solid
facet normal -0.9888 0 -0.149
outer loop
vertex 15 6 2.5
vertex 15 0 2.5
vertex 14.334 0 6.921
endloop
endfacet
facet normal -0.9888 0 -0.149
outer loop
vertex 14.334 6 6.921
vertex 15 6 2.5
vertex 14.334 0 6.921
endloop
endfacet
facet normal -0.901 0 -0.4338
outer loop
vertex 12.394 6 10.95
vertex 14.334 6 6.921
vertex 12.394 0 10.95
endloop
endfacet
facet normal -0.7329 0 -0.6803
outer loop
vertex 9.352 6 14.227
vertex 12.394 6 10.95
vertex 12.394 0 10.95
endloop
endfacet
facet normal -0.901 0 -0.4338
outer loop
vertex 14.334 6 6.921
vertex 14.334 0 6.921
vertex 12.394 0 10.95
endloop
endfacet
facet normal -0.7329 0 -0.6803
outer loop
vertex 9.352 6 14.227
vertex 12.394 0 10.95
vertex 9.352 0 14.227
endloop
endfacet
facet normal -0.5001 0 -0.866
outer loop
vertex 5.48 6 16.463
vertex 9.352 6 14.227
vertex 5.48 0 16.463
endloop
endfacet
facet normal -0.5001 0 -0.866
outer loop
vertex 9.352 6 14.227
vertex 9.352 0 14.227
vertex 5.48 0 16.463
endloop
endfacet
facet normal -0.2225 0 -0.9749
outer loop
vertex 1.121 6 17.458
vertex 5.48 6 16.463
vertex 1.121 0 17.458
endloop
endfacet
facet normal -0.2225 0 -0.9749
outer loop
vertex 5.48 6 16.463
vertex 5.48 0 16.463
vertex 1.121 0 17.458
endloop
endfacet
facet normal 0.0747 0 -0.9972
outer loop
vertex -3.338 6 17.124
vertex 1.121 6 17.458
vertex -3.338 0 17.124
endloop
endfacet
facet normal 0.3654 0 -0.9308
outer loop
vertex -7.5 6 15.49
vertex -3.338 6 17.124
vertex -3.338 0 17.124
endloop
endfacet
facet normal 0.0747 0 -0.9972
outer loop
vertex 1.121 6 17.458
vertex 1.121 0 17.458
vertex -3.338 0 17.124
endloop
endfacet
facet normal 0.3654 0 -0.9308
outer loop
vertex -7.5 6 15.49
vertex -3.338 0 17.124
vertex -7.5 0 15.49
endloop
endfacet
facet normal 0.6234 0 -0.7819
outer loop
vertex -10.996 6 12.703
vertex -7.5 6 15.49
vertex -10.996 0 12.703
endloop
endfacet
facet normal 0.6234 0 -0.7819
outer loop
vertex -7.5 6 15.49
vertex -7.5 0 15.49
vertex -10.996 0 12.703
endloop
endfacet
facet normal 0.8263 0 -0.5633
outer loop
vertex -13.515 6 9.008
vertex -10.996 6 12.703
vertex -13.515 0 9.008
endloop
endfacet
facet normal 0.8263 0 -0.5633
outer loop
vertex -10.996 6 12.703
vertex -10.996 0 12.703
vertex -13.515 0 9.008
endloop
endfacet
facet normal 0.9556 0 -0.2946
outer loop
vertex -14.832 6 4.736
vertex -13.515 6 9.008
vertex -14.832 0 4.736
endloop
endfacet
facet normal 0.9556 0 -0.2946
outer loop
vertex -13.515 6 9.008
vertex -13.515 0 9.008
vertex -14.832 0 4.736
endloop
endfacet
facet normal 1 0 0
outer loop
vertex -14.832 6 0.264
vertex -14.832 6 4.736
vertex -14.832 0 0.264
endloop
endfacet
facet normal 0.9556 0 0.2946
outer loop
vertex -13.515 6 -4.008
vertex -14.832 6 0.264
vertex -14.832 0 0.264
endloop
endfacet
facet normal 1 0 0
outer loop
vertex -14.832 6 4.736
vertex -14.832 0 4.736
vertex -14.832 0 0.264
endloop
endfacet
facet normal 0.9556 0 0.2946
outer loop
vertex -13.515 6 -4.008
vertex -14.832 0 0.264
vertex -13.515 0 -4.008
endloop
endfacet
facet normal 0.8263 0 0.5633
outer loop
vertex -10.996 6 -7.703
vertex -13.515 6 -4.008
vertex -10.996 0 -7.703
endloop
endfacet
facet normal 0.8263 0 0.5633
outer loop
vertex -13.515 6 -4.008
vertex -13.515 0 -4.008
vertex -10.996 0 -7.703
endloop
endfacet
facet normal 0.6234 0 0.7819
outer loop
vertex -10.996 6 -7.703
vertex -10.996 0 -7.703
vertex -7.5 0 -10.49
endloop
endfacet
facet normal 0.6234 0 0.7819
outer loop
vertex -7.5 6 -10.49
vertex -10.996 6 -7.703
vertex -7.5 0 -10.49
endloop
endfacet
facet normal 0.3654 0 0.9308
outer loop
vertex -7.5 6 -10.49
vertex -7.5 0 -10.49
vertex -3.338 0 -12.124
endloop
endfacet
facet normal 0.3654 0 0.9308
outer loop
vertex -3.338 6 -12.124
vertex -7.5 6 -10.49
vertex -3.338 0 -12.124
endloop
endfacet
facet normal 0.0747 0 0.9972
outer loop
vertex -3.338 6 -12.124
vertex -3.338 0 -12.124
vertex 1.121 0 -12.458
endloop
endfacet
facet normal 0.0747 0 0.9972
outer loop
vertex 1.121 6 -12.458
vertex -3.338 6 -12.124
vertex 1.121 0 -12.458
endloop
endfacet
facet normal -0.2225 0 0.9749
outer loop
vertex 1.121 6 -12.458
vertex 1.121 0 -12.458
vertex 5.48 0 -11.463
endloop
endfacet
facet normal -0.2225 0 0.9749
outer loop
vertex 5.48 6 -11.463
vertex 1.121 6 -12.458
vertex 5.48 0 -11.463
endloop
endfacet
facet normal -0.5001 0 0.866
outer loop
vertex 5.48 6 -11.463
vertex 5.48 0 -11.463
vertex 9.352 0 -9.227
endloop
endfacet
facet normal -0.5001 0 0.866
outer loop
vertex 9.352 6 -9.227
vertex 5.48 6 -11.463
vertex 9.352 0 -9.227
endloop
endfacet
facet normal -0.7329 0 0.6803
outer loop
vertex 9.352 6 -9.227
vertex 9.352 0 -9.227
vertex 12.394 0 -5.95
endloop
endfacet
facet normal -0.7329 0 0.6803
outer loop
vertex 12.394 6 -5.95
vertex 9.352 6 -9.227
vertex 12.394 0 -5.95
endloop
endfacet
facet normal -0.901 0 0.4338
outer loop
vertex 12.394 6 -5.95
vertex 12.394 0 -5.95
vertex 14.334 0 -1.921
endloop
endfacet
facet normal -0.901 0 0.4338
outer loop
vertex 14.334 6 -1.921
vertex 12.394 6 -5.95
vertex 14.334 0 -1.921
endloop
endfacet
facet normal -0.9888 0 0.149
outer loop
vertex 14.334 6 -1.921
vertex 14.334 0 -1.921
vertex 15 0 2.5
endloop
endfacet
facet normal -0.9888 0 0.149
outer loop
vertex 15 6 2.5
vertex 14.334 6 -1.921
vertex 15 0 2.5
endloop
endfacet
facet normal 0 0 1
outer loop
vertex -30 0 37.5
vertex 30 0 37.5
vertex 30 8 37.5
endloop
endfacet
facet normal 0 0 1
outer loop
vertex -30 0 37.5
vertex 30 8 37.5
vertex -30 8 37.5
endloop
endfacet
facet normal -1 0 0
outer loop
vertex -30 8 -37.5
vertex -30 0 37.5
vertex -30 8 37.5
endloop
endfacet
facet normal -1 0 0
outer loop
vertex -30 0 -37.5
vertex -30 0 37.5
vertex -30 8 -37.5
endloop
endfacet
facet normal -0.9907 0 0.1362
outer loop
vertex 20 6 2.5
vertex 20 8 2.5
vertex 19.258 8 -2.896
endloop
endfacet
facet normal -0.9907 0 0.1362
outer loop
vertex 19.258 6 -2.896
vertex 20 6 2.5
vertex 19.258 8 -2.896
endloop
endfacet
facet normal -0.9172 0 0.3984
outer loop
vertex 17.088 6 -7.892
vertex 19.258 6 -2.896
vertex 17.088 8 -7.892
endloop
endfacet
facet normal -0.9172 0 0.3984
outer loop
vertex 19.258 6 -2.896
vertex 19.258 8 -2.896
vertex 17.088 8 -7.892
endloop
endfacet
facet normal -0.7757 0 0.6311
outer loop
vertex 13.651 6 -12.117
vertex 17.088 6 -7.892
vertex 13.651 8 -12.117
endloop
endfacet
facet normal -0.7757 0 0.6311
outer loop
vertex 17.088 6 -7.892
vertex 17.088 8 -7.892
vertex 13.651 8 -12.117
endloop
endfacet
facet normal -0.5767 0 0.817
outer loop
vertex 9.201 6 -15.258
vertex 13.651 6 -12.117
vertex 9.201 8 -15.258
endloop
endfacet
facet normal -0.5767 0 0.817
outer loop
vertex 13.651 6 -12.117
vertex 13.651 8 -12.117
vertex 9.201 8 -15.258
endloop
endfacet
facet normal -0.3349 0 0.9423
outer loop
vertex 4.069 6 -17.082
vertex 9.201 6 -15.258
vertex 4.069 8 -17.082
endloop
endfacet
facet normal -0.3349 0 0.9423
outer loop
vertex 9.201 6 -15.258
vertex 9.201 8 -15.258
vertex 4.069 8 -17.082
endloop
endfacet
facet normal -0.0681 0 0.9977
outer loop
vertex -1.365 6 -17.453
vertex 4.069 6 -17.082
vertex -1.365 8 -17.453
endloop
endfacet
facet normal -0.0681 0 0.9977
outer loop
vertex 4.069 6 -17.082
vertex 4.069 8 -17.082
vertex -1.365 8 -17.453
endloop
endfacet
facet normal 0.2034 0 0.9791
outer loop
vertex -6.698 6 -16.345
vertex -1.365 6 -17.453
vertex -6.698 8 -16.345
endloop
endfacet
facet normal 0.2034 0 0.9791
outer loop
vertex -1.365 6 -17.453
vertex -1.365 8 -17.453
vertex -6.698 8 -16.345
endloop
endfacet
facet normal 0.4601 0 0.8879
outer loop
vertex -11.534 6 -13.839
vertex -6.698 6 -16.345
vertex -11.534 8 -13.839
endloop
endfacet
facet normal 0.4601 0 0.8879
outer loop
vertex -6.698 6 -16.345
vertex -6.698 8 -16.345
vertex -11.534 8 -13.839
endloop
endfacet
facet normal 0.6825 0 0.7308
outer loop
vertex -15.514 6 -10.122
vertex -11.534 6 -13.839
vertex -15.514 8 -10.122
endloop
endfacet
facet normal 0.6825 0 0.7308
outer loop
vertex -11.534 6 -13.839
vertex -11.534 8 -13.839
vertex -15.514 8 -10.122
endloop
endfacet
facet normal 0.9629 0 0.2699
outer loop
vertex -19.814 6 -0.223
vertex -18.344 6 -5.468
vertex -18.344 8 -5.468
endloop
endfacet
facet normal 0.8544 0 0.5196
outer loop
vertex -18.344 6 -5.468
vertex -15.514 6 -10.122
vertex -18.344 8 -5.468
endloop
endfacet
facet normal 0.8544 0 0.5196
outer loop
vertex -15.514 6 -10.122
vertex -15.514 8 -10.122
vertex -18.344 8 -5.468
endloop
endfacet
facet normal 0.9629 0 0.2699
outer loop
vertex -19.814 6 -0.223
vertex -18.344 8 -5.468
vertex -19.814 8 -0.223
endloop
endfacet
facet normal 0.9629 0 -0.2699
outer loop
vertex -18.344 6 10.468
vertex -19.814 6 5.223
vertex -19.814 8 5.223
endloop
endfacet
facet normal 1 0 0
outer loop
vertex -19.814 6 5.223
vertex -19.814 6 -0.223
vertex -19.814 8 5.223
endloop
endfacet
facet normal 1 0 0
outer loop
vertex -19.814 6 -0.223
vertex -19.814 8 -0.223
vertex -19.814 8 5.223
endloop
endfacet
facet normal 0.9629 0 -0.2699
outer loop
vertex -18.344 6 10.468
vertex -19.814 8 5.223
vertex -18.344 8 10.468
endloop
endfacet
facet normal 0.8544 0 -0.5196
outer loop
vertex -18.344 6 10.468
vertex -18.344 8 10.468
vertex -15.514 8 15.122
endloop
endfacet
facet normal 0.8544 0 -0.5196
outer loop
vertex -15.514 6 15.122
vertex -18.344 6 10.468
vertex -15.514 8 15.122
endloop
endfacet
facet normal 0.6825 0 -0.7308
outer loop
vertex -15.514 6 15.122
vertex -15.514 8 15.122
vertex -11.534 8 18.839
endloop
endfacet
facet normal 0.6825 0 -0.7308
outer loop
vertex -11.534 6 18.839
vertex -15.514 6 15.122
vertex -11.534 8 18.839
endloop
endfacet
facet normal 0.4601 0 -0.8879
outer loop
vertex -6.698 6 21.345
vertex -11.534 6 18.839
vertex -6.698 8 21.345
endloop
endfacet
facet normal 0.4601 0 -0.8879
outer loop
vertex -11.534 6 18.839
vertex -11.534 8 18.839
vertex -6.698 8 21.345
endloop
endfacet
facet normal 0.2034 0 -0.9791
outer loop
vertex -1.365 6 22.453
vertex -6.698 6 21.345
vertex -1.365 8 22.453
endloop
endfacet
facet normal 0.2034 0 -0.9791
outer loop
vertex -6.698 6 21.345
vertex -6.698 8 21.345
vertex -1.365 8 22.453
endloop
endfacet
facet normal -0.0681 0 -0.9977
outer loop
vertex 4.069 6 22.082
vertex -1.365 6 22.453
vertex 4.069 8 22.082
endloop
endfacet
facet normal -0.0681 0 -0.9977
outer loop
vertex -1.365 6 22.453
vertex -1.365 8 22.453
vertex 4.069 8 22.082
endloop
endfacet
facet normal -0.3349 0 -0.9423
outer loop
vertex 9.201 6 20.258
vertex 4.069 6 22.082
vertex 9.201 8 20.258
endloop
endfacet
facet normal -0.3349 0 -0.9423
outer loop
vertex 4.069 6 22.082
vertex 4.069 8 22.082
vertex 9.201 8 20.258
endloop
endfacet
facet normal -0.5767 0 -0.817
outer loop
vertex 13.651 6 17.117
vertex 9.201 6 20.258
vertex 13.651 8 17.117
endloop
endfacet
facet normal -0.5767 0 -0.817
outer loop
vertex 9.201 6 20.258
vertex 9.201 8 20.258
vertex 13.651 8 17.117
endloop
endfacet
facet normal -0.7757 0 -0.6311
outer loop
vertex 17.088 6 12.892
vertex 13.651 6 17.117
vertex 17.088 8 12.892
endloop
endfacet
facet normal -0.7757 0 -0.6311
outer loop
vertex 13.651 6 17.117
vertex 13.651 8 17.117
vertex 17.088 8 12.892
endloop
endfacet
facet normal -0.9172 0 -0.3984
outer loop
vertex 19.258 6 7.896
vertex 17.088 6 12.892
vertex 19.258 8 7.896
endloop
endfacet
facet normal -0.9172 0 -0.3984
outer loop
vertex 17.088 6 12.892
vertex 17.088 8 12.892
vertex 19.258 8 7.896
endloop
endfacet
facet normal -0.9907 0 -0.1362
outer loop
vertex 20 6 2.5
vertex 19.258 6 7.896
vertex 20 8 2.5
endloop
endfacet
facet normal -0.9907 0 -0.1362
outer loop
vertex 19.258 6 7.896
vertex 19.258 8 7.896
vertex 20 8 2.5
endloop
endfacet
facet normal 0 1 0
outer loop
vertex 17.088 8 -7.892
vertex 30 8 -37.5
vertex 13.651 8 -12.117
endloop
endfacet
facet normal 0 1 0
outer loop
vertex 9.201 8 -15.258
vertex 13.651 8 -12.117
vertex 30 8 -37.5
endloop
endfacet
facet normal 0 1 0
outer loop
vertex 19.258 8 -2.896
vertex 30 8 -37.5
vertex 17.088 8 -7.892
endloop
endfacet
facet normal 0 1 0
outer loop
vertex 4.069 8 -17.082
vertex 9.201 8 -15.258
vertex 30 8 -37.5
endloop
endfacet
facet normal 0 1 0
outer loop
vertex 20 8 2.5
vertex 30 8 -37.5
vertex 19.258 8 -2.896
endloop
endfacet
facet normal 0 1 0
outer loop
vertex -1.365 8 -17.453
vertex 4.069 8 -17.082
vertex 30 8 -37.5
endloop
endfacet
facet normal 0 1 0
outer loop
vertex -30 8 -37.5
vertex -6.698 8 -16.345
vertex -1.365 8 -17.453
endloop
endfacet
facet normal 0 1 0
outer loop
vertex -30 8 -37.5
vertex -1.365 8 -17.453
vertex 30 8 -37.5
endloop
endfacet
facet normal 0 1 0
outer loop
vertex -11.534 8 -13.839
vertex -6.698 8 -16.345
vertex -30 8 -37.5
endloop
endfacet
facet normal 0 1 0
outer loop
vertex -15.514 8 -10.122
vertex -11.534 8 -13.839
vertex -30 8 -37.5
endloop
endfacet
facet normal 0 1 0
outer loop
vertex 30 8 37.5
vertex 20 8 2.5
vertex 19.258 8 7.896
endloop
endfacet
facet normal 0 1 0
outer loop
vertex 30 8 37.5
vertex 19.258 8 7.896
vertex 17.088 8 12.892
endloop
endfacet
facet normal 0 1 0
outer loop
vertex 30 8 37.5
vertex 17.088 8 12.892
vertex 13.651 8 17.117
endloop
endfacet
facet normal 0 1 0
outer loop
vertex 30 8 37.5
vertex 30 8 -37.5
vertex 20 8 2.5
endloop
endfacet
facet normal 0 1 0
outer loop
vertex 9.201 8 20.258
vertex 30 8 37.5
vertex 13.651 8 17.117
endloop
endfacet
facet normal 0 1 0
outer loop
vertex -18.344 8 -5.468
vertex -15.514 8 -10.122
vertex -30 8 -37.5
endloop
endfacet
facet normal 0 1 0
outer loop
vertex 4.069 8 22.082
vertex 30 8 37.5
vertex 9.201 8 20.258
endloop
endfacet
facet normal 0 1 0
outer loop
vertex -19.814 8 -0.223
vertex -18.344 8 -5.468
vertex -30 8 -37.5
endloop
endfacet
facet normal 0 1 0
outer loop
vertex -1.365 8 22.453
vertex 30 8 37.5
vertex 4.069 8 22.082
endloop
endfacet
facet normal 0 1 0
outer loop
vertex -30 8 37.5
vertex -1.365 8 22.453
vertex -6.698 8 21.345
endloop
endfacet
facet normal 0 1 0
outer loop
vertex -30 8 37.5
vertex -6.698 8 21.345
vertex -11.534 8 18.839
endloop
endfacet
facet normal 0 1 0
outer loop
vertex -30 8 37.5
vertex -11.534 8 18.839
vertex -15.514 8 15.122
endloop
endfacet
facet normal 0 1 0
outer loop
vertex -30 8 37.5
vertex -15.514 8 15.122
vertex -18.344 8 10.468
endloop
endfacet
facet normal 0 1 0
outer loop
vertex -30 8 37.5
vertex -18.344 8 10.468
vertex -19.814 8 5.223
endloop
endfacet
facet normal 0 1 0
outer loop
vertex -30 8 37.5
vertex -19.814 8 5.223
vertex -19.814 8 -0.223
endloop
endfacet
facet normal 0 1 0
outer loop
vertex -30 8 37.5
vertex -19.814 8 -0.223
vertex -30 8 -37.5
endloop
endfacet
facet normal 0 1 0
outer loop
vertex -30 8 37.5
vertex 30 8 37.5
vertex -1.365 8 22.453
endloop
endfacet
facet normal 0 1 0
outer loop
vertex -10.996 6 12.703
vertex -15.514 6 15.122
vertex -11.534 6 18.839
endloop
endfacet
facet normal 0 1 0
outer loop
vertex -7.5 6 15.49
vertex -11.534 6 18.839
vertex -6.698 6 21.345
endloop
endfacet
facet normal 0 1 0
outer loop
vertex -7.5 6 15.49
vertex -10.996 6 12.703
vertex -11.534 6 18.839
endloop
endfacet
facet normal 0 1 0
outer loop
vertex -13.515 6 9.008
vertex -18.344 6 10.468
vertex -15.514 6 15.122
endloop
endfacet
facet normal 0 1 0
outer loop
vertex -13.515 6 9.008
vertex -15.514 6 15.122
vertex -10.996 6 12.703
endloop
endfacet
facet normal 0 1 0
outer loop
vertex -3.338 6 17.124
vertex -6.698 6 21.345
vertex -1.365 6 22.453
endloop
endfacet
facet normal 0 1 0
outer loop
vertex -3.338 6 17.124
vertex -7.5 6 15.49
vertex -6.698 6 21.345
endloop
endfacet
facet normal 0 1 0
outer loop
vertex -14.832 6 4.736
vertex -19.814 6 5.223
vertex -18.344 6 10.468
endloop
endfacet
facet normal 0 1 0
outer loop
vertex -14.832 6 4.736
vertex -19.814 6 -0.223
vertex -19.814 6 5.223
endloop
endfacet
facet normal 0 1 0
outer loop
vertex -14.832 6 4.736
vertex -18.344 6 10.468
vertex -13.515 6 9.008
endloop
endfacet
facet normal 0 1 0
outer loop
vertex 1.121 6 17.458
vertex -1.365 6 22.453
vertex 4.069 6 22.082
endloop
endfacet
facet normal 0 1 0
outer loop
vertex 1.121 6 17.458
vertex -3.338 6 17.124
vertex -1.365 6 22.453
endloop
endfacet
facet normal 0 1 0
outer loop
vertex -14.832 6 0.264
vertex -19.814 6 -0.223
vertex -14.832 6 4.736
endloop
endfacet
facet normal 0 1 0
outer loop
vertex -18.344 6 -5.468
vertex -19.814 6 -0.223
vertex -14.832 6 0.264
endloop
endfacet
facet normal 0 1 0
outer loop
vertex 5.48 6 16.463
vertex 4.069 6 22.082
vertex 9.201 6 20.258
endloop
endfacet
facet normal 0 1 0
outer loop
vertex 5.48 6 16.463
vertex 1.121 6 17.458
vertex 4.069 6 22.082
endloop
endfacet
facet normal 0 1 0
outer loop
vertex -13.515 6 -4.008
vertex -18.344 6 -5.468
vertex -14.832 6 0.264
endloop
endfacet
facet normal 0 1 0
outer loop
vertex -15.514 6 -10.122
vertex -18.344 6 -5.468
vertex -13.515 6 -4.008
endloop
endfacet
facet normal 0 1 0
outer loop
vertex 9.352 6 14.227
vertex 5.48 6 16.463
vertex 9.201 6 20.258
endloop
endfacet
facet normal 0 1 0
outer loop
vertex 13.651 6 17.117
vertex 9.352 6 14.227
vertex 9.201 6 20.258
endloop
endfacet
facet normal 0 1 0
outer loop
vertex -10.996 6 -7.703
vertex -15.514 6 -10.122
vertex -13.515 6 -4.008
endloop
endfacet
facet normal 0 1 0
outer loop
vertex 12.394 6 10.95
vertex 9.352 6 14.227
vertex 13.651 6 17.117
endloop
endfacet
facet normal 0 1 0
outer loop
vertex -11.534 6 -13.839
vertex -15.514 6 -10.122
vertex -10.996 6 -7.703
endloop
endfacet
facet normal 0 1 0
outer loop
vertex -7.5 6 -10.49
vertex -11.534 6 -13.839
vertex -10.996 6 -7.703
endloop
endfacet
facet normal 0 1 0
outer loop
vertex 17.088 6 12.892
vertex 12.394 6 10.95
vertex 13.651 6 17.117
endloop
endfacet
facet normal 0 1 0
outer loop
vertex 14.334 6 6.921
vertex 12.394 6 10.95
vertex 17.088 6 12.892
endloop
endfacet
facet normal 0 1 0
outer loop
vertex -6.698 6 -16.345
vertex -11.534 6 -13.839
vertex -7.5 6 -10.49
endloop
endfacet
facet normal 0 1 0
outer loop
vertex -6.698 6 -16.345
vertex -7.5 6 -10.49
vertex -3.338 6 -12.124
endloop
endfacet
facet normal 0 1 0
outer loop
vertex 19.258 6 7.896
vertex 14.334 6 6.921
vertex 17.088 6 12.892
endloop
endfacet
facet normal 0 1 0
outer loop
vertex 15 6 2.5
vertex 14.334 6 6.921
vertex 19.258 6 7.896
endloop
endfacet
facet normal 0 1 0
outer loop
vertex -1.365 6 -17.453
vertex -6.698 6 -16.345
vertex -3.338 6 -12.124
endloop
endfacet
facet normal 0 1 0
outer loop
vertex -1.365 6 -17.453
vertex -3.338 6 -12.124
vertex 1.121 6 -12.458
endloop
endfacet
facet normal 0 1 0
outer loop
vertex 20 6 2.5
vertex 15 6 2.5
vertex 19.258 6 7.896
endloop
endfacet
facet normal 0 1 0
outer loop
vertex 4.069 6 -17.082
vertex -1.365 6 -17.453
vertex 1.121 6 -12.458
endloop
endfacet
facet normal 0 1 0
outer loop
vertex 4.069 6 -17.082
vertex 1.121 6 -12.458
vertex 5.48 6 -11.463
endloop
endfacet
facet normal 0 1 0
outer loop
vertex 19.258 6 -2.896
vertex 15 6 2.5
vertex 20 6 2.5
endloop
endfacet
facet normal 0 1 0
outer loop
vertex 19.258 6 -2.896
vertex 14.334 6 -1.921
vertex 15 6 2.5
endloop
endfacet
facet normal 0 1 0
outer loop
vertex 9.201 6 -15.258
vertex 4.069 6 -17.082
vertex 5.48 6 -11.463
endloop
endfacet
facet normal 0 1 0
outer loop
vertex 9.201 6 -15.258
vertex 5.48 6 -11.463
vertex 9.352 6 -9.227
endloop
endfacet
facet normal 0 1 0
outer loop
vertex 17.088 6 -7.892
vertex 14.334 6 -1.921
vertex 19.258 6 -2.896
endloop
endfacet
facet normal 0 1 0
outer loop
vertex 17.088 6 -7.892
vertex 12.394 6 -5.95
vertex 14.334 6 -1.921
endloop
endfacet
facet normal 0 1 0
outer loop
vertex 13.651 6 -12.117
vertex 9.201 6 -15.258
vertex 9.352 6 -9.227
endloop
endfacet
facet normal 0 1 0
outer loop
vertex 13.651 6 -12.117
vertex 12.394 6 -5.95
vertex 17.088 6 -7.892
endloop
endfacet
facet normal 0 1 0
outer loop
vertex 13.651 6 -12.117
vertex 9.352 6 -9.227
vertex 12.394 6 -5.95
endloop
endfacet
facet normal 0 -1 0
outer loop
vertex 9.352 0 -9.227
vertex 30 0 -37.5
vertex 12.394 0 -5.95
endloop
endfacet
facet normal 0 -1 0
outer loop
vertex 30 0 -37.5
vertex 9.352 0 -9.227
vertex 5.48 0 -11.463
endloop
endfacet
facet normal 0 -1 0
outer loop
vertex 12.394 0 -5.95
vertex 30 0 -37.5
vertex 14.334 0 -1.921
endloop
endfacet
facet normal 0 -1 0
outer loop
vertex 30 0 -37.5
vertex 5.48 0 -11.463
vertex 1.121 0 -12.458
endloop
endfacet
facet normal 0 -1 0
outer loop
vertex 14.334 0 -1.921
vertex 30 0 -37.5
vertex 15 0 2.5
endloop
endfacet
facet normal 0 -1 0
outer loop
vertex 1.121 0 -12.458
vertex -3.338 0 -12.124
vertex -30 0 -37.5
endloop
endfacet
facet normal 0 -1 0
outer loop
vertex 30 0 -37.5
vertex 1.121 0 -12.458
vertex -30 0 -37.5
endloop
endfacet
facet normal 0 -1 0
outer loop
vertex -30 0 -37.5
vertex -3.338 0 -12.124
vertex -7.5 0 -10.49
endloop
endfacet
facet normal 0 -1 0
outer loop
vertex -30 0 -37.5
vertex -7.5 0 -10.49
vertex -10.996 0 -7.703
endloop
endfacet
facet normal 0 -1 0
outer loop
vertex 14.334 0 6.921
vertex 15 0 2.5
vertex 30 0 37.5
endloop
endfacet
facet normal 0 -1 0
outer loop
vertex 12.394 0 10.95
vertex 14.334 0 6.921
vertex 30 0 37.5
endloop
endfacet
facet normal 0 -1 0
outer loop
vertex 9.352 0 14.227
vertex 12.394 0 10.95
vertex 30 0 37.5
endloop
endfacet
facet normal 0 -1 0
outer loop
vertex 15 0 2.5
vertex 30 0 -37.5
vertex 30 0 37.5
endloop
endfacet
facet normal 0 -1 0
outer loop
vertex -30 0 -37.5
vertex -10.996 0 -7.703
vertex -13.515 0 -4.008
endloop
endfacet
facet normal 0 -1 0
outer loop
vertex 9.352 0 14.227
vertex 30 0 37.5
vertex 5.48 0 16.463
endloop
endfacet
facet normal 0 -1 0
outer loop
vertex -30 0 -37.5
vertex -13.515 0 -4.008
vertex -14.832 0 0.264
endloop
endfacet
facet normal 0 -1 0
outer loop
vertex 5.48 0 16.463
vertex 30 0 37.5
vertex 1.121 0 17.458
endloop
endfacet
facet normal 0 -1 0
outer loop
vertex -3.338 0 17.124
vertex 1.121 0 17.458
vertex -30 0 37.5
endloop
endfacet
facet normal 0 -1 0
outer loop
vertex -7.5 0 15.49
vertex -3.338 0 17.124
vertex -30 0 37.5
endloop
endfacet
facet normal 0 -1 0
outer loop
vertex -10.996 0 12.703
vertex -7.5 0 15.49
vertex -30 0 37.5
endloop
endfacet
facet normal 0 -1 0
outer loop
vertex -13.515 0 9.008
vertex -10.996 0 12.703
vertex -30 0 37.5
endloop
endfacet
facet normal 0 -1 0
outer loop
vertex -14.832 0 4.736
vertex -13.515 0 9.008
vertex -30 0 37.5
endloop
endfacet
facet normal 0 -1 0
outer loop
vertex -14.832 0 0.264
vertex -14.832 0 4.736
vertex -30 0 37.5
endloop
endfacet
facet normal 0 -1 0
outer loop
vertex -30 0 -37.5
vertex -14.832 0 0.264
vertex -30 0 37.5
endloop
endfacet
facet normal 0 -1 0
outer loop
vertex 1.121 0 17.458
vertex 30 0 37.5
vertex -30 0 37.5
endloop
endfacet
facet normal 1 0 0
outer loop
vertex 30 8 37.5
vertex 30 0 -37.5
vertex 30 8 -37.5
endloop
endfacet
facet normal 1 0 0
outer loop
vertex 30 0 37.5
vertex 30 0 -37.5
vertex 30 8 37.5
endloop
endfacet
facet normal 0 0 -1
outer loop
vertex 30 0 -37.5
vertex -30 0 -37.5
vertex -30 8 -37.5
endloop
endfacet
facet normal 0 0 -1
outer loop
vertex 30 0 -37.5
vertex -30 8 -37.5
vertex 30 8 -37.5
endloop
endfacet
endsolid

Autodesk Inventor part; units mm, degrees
ref_plane "YZ Plane" through (0, 0, 0) normal (1, 0, 0) x (0, 1, 0)
ref_plane "XZ Plane" through (0, 0, 0) normal (0, 1, 0) x (-1, 0, 0)
ref_plane "XY Plane" through (0, 0, 0) normal (0, 0, 1) x (1, 0, 0)
sketch "Szkic1" plane through (0, 0, 0) normal (0, 1, 0) x (-1, 0, 0)
  line L0 (-30, 37.5) -> (30, 37.5)
  line L1 (30, 37.5) -> (30, -37.5)
  line L2 (30, -37.5) -> (-30, -37.5)
  line L3 (-30, -37.5) -> (-30, 37.5)
  line L4 (-30, 37.5) -> (30, -37.5) construction
  line L5 (30, 37.5) -> (-30, -37.5) construction
  point P0 (0, 0)
  dimension "d0" = 60
  dimension "d1" = 75
extrude "Wyciągnięcie proste1" add sketch "Szkic1" along normal blind 8
sketch "Szkic2" plane through (0, 8, 0) normal (0, 1, 0) x (1, 0, 0)
  line L0 (-30, -37.5) -> (30, -37.5) projected
  line L1 (0, -37.5) -> (0, -2.5)
  circle A0 centre (0, -2.5) radius 20
  point P0 (0, 0)
  dimension "d4" = 35
  dimension "d5" = 40
extrude "Wyciągnięcie proste2" cut sketch "Szkic2" against normal blind 2
sketch "Szkic3" plane through (0, 6, 2.5) normal (0, 1, 0) x (1, 0, 0)
  circle A0 centre (0, 0) radius 20 projected
  circle A1 centre (0, 0) radius 5
  point P0 (0, 2.5)
  dimension "d8" = 10
extrude "Wyciągnięcie proste3" cut sketch "Szkic3" against normal up to next contours A1
sketch "Szkic4" plane through (0, 0, 0) normal (0, -1, 0) x (1, 0, 0)
  circle A0 centre (0, 2.5) radius 5 projected
  circle A1 centre (0, 2.5) radius 15
  point P0 (0, 0)
  dimension "d11" = 30
extrude "Wyciągnięcie proste4" cut sketch "Szkic4" against normal up to next
properties part number "Uchwyt silnika krokowego osi Z - płaski"
